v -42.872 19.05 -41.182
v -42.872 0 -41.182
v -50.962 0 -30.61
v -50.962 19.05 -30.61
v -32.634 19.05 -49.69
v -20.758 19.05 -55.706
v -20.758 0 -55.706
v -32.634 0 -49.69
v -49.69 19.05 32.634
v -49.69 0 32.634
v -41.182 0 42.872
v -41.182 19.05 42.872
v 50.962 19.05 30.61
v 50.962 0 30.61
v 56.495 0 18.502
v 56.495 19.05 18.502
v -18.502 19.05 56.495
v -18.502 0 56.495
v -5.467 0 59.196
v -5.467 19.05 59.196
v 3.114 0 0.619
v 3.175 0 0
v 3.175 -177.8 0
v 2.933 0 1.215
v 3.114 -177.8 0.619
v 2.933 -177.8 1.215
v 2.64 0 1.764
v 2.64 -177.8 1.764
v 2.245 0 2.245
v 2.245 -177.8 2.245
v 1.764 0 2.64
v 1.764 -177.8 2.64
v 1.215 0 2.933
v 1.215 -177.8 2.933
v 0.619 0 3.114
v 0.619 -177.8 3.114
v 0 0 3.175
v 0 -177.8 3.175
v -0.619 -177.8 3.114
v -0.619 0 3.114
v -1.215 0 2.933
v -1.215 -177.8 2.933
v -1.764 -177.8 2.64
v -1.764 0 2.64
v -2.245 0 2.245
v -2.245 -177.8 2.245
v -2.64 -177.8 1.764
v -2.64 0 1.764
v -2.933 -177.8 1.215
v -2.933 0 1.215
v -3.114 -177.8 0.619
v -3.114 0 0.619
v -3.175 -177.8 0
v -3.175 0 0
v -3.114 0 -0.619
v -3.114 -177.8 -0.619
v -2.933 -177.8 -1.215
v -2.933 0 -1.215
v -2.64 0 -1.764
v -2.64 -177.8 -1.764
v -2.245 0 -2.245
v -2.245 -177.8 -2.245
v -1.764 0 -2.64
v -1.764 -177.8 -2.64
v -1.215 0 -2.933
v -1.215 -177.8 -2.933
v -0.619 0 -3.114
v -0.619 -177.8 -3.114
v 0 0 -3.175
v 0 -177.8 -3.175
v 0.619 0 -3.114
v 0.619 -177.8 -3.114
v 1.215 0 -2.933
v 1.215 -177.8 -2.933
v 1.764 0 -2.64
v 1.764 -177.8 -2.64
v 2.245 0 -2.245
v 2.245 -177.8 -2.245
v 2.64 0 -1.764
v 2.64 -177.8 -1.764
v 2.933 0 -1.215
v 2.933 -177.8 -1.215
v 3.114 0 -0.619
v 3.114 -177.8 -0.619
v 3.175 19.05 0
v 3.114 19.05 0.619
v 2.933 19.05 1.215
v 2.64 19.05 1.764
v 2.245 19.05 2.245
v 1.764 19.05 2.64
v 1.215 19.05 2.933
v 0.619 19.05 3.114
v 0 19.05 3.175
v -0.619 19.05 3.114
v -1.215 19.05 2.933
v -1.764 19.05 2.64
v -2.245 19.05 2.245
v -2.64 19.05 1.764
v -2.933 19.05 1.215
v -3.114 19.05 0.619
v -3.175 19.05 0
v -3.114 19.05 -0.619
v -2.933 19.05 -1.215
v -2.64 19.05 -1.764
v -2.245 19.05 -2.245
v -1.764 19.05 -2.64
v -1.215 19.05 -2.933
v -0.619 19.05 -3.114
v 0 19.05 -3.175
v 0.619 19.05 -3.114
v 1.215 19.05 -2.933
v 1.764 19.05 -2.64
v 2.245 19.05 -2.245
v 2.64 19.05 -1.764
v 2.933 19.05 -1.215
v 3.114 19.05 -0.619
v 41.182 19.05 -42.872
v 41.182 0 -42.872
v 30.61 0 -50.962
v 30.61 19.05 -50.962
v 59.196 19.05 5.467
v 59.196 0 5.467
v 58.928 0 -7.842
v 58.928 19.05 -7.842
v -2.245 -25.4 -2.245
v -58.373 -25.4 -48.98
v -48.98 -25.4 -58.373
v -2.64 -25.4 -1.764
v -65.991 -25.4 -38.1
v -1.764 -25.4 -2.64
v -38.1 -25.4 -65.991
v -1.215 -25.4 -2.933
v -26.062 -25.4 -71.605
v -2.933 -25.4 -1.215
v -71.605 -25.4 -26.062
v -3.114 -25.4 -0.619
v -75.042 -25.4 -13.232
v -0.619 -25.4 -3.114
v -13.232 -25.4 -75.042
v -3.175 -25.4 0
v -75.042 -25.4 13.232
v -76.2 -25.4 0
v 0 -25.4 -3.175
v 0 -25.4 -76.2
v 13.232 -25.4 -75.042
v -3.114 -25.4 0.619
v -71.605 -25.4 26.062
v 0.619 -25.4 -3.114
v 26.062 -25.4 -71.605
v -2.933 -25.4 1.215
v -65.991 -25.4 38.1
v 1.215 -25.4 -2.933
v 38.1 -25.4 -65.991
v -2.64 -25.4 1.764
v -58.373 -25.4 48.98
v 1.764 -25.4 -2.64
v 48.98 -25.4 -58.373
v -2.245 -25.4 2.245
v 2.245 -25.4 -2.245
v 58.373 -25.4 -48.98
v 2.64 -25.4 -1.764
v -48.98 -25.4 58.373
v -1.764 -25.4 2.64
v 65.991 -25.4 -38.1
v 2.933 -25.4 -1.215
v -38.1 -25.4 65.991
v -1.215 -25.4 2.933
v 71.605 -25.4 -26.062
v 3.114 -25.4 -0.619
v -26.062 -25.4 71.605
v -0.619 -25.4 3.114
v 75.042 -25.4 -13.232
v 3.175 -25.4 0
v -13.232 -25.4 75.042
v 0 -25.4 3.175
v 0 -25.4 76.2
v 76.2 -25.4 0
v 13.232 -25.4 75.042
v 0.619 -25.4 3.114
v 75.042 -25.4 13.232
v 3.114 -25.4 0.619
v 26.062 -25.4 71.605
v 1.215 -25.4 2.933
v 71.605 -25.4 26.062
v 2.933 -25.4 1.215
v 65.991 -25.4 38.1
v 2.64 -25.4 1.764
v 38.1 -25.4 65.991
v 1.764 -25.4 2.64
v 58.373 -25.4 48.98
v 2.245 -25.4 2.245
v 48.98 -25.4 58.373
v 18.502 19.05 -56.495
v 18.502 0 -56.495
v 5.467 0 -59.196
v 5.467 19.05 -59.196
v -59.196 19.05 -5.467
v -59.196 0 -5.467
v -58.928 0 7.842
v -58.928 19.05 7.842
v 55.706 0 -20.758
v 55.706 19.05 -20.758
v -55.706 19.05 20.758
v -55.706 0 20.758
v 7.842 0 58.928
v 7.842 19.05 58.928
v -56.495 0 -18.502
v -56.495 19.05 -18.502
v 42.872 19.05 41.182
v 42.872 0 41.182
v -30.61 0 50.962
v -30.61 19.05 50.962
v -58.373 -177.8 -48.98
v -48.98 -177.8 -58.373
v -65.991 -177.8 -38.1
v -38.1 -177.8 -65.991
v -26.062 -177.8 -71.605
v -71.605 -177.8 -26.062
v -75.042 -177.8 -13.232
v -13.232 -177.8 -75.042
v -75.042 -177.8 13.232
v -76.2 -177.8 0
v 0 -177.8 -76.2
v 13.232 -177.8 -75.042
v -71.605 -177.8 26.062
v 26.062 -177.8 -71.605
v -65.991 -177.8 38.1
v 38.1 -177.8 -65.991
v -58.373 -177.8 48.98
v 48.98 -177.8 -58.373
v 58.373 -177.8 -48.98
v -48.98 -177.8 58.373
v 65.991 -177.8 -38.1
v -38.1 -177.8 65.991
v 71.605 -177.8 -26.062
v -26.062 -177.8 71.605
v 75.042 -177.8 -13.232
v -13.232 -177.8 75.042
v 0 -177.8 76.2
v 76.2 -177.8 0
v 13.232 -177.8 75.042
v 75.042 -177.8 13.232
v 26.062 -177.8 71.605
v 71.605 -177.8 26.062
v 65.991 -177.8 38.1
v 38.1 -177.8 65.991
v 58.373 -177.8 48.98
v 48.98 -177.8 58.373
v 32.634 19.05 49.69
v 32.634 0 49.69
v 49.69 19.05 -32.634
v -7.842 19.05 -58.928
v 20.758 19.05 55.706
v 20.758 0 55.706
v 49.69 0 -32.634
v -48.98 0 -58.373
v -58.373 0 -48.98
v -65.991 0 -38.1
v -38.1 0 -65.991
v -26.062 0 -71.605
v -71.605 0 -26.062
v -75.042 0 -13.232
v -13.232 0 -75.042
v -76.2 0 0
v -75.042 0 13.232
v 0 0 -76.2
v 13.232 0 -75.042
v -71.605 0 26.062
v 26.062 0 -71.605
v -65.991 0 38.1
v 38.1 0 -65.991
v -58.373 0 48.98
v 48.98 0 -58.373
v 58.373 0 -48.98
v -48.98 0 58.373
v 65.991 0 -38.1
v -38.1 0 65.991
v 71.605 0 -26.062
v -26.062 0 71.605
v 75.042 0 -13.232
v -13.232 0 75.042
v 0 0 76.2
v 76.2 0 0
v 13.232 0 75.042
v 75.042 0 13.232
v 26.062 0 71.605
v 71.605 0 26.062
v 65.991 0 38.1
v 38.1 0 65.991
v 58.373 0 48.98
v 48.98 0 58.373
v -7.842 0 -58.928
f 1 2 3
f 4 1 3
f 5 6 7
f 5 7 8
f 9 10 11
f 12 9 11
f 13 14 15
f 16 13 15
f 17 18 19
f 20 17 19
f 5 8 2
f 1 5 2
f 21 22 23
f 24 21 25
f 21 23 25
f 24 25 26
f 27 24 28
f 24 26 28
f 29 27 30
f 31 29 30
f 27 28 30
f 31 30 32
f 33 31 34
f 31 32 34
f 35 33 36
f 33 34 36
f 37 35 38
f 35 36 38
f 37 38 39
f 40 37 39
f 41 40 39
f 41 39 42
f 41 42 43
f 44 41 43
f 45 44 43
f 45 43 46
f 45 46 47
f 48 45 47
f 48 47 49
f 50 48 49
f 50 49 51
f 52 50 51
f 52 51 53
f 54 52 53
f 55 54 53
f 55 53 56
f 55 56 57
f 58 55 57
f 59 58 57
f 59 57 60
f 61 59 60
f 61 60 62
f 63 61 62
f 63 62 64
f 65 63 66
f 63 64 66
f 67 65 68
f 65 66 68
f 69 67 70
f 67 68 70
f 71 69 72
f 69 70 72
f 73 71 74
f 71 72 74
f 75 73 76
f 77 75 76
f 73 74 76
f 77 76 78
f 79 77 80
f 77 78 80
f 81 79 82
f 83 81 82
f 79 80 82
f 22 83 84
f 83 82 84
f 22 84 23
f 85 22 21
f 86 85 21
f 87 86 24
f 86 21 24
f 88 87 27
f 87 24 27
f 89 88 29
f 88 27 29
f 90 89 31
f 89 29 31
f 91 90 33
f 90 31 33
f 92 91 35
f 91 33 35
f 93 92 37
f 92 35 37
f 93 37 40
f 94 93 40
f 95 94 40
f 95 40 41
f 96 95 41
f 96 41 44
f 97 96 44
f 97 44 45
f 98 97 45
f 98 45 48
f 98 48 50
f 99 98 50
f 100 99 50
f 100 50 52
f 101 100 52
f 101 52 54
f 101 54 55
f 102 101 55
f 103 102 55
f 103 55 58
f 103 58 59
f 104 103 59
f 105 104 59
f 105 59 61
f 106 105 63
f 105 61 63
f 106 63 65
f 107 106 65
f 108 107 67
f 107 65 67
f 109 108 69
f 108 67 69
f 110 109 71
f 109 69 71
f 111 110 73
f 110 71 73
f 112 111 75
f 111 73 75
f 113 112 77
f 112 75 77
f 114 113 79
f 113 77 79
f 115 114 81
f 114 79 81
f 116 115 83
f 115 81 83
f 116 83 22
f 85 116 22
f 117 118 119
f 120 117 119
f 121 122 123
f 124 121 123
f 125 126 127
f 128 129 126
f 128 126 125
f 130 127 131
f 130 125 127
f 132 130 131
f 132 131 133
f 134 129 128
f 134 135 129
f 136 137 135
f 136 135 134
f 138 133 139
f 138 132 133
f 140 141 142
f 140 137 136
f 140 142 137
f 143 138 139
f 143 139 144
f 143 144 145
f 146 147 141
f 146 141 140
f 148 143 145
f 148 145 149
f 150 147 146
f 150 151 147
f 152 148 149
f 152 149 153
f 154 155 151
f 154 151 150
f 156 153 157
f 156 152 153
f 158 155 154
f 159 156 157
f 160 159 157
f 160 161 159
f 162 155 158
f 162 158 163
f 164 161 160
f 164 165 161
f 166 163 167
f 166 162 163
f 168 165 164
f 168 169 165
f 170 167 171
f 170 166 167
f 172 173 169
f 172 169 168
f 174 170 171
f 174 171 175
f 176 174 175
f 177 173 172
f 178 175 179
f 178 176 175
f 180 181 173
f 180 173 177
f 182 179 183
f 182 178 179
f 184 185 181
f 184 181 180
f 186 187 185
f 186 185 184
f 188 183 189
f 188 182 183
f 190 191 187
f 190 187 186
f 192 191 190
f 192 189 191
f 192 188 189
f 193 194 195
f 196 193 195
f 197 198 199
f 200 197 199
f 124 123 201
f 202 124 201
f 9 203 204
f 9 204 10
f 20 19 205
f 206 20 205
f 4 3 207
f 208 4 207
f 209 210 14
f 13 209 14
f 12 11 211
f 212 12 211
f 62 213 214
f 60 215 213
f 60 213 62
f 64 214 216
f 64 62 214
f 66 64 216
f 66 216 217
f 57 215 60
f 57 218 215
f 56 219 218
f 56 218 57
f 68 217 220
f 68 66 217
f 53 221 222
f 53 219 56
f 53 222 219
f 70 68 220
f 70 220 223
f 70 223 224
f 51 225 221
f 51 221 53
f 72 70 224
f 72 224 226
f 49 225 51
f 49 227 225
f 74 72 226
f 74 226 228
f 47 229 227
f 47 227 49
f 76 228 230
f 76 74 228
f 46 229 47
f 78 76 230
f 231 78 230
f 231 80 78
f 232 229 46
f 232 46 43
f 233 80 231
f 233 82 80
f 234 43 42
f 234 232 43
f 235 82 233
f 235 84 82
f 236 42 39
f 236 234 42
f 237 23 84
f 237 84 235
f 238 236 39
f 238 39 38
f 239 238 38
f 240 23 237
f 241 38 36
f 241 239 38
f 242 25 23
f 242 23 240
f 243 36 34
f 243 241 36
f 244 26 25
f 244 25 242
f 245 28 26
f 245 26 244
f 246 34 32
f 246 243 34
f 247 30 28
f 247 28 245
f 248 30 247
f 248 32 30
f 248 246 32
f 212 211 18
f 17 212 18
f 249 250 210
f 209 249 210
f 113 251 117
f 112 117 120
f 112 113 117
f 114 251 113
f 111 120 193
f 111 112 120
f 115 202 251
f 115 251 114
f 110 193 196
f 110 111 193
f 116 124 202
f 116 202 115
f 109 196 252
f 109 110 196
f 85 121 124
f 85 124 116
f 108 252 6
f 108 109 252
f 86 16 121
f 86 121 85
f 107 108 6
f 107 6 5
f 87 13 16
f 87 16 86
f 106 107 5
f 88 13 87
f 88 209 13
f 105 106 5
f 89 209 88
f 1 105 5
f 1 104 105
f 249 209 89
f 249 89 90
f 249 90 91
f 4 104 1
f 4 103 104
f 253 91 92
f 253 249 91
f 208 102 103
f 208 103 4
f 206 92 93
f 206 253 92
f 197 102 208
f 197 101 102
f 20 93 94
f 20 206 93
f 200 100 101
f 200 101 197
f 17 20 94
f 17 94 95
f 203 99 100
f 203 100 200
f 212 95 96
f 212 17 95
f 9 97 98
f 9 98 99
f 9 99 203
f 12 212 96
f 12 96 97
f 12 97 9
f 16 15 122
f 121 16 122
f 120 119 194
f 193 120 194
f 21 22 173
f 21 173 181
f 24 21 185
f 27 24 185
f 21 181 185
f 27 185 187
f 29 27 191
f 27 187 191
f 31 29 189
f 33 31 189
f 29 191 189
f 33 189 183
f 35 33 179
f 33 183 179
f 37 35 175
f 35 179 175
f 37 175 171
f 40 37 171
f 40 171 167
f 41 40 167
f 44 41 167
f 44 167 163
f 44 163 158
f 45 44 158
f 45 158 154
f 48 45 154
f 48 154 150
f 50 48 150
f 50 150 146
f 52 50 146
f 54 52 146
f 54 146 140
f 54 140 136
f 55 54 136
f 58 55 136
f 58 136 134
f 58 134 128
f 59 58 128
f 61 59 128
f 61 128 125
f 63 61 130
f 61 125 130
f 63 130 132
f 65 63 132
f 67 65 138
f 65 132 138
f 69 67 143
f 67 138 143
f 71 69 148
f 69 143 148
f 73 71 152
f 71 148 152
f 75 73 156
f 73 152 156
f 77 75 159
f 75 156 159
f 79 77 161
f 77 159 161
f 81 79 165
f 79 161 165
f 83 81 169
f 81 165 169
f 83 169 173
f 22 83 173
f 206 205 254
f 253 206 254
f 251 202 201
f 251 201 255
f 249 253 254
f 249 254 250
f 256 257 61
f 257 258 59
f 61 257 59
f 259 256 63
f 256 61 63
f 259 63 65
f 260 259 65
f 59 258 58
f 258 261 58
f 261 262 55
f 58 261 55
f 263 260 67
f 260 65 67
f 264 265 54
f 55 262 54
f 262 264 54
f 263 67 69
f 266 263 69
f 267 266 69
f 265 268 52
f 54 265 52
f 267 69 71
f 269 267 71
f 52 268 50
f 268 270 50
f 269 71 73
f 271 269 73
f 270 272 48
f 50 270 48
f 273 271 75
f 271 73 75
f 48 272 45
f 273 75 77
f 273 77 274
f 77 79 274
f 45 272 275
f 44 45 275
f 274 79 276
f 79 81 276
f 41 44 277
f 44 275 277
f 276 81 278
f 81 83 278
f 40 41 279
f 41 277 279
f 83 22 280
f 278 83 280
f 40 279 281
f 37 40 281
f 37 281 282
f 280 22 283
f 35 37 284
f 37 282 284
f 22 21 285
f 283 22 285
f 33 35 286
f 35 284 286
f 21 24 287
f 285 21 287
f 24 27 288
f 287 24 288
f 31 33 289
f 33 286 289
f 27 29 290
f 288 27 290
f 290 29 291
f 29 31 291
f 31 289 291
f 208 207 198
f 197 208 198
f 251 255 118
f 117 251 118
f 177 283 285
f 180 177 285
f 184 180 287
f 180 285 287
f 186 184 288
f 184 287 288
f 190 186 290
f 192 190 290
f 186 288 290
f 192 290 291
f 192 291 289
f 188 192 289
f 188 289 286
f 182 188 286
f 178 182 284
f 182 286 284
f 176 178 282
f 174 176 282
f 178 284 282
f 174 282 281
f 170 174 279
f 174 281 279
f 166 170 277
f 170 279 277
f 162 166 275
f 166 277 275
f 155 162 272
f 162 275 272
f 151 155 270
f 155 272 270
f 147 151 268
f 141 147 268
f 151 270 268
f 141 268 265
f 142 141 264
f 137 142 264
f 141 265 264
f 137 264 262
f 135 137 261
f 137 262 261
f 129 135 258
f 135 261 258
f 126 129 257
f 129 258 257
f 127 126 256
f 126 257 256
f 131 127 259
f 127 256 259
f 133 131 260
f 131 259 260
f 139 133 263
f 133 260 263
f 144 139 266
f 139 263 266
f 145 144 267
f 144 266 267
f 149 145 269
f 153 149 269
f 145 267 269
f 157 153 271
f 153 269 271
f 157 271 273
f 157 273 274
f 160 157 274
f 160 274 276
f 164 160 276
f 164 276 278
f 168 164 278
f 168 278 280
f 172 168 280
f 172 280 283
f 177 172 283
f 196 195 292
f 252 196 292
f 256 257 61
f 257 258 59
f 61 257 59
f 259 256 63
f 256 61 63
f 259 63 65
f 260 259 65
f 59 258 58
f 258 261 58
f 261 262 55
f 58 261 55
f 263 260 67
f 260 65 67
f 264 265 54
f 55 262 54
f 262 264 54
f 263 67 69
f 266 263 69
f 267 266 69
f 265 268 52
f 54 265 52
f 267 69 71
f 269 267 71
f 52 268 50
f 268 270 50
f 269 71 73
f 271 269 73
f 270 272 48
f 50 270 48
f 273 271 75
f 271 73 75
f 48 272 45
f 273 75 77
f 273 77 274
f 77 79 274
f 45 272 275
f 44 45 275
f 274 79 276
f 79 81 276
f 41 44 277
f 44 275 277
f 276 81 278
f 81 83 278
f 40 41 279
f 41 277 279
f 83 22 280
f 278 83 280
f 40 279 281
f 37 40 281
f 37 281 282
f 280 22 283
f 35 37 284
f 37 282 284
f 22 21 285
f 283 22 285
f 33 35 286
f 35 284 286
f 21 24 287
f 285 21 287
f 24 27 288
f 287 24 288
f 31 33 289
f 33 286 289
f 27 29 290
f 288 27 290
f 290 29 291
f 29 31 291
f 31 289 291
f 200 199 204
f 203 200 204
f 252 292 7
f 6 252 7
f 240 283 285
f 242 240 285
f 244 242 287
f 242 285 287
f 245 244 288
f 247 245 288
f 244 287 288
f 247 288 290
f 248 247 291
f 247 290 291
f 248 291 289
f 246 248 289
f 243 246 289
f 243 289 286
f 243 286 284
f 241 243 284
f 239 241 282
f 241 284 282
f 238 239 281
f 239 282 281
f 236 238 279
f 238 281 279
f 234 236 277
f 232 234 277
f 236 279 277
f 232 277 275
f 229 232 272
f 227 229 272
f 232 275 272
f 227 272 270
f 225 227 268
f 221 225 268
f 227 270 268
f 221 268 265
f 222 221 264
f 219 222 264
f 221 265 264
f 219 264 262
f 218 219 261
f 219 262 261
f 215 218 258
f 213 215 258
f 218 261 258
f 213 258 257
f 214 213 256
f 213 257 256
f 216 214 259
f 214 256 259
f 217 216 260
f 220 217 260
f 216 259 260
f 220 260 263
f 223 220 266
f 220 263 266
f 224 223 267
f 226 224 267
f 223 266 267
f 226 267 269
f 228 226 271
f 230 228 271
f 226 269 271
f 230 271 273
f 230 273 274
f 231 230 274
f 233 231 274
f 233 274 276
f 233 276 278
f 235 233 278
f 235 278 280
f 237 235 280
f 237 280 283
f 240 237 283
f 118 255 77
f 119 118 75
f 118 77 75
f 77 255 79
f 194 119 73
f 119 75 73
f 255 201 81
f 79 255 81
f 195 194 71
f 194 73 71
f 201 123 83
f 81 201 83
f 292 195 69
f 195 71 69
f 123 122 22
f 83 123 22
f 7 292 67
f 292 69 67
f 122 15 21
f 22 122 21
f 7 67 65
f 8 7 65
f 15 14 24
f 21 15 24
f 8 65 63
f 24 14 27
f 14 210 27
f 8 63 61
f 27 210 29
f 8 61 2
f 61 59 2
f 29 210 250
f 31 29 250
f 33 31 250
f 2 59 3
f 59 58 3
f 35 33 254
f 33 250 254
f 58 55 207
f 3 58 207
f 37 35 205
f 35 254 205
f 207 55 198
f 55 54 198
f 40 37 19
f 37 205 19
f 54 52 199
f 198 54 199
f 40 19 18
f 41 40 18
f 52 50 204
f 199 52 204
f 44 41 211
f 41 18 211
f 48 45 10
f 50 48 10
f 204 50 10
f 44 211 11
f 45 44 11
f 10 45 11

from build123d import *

# Parameters (mm, degrees)
F0_R     = 76.2
F2_DEPTH = 177.8
F1_R     = 76.2
F3_DEPTH = 25.4
F5_DEPTH = 19.05
F9_D     = 6.35
F9_2_D   = 6.35
F9_3_D   = 6.35


# Not quite as in the source:
# - the program builds the solid bodies; features that only make, move or delete a surface that nothing else refers to are left out


with BuildPart() as f2:
    # F0 (on Front) → F2 (new body)
    with BuildSketch(Plane.XZ):
        Circle(F0_R)
    extrude(amount=F2_DEPTH)

    # F9 (through all)
    with Locations(Plane(origin=(0, 19.05, 0), x_dir=(-1, 0, 0), z_dir=(0, 1, 0))):
        with Locations((0, 0)):
            Hole(F9_D / 2)


with BuildPart() as f3:
    # F1 (on face) → F3 (new body)
    with BuildSketch(Plane.XZ):
        Circle(F1_R)
    extrude(amount=F3_DEPTH)

    # F9#2 (through all)
    with Locations(Plane(origin=(0, 19.05, 0), x_dir=(-1, 0, 0), z_dir=(0, 1, 0))):
        with Locations((0, 0)):
            Hole(F9_2_D / 2)


with BuildPart() as f5:
    # F4 (on face) → F5 (new body)
    with BuildSketch(Plane(origin=(0, 0, 0), x_dir=(-1, 0, 0), z_dir=(0, 1, 0))):
        Polygon((49.6898963324, 32.6336398575), (41.1823988684, 42.8724885133), (30.6098439624, 50.961531575), (18.5023836646, 56.4951506468), (5.4671365906, 59.1958669619), (-7.8422555409, 58.9282553272), (-20.7584042331, 55.7057349074), (-32.6336398575, 49.6898963324), (-42.8724885133, 41.1823988684), (-50.961531575, 30.6098439624), (-56.4951506468, 18.5023836646), (-59.1958669619, 5.4671365906), (-58.9282553272, -7.8422555409), (-55.7057349074, -20.7584042331), (-49.6898963324, -32.6336398575), (-41.1823988684, -42.8724885133), (-30.6098439624, -50.961531575), (-18.5023836646, -56.4951506468), (-5.4671365906, -59.1958669619), (7.8422555409, -58.9282553272), (20.7584042331, -55.7057349074), (32.6336398575, -49.6898963324), (42.8724885133, -41.1823988684), (50.961531575, -30.6098439624), (56.4951506468, -18.5023836646), (59.1958669619, -5.4671365906), (58.9282553272, 7.8422555409), (55.7057349074, 20.7584042331), align=None)
    extrude(amount=F5_DEPTH)

    # F9#3 (through all)
    with Locations(Plane(origin=(0, 19.05, 0), x_dir=(-1, 0, 0), z_dir=(0, 1, 0))):
        with Locations((0, 0)):
            Hole(F9_3_D / 2)


solid = Compound([f2.part, f3.part, f5.part])
